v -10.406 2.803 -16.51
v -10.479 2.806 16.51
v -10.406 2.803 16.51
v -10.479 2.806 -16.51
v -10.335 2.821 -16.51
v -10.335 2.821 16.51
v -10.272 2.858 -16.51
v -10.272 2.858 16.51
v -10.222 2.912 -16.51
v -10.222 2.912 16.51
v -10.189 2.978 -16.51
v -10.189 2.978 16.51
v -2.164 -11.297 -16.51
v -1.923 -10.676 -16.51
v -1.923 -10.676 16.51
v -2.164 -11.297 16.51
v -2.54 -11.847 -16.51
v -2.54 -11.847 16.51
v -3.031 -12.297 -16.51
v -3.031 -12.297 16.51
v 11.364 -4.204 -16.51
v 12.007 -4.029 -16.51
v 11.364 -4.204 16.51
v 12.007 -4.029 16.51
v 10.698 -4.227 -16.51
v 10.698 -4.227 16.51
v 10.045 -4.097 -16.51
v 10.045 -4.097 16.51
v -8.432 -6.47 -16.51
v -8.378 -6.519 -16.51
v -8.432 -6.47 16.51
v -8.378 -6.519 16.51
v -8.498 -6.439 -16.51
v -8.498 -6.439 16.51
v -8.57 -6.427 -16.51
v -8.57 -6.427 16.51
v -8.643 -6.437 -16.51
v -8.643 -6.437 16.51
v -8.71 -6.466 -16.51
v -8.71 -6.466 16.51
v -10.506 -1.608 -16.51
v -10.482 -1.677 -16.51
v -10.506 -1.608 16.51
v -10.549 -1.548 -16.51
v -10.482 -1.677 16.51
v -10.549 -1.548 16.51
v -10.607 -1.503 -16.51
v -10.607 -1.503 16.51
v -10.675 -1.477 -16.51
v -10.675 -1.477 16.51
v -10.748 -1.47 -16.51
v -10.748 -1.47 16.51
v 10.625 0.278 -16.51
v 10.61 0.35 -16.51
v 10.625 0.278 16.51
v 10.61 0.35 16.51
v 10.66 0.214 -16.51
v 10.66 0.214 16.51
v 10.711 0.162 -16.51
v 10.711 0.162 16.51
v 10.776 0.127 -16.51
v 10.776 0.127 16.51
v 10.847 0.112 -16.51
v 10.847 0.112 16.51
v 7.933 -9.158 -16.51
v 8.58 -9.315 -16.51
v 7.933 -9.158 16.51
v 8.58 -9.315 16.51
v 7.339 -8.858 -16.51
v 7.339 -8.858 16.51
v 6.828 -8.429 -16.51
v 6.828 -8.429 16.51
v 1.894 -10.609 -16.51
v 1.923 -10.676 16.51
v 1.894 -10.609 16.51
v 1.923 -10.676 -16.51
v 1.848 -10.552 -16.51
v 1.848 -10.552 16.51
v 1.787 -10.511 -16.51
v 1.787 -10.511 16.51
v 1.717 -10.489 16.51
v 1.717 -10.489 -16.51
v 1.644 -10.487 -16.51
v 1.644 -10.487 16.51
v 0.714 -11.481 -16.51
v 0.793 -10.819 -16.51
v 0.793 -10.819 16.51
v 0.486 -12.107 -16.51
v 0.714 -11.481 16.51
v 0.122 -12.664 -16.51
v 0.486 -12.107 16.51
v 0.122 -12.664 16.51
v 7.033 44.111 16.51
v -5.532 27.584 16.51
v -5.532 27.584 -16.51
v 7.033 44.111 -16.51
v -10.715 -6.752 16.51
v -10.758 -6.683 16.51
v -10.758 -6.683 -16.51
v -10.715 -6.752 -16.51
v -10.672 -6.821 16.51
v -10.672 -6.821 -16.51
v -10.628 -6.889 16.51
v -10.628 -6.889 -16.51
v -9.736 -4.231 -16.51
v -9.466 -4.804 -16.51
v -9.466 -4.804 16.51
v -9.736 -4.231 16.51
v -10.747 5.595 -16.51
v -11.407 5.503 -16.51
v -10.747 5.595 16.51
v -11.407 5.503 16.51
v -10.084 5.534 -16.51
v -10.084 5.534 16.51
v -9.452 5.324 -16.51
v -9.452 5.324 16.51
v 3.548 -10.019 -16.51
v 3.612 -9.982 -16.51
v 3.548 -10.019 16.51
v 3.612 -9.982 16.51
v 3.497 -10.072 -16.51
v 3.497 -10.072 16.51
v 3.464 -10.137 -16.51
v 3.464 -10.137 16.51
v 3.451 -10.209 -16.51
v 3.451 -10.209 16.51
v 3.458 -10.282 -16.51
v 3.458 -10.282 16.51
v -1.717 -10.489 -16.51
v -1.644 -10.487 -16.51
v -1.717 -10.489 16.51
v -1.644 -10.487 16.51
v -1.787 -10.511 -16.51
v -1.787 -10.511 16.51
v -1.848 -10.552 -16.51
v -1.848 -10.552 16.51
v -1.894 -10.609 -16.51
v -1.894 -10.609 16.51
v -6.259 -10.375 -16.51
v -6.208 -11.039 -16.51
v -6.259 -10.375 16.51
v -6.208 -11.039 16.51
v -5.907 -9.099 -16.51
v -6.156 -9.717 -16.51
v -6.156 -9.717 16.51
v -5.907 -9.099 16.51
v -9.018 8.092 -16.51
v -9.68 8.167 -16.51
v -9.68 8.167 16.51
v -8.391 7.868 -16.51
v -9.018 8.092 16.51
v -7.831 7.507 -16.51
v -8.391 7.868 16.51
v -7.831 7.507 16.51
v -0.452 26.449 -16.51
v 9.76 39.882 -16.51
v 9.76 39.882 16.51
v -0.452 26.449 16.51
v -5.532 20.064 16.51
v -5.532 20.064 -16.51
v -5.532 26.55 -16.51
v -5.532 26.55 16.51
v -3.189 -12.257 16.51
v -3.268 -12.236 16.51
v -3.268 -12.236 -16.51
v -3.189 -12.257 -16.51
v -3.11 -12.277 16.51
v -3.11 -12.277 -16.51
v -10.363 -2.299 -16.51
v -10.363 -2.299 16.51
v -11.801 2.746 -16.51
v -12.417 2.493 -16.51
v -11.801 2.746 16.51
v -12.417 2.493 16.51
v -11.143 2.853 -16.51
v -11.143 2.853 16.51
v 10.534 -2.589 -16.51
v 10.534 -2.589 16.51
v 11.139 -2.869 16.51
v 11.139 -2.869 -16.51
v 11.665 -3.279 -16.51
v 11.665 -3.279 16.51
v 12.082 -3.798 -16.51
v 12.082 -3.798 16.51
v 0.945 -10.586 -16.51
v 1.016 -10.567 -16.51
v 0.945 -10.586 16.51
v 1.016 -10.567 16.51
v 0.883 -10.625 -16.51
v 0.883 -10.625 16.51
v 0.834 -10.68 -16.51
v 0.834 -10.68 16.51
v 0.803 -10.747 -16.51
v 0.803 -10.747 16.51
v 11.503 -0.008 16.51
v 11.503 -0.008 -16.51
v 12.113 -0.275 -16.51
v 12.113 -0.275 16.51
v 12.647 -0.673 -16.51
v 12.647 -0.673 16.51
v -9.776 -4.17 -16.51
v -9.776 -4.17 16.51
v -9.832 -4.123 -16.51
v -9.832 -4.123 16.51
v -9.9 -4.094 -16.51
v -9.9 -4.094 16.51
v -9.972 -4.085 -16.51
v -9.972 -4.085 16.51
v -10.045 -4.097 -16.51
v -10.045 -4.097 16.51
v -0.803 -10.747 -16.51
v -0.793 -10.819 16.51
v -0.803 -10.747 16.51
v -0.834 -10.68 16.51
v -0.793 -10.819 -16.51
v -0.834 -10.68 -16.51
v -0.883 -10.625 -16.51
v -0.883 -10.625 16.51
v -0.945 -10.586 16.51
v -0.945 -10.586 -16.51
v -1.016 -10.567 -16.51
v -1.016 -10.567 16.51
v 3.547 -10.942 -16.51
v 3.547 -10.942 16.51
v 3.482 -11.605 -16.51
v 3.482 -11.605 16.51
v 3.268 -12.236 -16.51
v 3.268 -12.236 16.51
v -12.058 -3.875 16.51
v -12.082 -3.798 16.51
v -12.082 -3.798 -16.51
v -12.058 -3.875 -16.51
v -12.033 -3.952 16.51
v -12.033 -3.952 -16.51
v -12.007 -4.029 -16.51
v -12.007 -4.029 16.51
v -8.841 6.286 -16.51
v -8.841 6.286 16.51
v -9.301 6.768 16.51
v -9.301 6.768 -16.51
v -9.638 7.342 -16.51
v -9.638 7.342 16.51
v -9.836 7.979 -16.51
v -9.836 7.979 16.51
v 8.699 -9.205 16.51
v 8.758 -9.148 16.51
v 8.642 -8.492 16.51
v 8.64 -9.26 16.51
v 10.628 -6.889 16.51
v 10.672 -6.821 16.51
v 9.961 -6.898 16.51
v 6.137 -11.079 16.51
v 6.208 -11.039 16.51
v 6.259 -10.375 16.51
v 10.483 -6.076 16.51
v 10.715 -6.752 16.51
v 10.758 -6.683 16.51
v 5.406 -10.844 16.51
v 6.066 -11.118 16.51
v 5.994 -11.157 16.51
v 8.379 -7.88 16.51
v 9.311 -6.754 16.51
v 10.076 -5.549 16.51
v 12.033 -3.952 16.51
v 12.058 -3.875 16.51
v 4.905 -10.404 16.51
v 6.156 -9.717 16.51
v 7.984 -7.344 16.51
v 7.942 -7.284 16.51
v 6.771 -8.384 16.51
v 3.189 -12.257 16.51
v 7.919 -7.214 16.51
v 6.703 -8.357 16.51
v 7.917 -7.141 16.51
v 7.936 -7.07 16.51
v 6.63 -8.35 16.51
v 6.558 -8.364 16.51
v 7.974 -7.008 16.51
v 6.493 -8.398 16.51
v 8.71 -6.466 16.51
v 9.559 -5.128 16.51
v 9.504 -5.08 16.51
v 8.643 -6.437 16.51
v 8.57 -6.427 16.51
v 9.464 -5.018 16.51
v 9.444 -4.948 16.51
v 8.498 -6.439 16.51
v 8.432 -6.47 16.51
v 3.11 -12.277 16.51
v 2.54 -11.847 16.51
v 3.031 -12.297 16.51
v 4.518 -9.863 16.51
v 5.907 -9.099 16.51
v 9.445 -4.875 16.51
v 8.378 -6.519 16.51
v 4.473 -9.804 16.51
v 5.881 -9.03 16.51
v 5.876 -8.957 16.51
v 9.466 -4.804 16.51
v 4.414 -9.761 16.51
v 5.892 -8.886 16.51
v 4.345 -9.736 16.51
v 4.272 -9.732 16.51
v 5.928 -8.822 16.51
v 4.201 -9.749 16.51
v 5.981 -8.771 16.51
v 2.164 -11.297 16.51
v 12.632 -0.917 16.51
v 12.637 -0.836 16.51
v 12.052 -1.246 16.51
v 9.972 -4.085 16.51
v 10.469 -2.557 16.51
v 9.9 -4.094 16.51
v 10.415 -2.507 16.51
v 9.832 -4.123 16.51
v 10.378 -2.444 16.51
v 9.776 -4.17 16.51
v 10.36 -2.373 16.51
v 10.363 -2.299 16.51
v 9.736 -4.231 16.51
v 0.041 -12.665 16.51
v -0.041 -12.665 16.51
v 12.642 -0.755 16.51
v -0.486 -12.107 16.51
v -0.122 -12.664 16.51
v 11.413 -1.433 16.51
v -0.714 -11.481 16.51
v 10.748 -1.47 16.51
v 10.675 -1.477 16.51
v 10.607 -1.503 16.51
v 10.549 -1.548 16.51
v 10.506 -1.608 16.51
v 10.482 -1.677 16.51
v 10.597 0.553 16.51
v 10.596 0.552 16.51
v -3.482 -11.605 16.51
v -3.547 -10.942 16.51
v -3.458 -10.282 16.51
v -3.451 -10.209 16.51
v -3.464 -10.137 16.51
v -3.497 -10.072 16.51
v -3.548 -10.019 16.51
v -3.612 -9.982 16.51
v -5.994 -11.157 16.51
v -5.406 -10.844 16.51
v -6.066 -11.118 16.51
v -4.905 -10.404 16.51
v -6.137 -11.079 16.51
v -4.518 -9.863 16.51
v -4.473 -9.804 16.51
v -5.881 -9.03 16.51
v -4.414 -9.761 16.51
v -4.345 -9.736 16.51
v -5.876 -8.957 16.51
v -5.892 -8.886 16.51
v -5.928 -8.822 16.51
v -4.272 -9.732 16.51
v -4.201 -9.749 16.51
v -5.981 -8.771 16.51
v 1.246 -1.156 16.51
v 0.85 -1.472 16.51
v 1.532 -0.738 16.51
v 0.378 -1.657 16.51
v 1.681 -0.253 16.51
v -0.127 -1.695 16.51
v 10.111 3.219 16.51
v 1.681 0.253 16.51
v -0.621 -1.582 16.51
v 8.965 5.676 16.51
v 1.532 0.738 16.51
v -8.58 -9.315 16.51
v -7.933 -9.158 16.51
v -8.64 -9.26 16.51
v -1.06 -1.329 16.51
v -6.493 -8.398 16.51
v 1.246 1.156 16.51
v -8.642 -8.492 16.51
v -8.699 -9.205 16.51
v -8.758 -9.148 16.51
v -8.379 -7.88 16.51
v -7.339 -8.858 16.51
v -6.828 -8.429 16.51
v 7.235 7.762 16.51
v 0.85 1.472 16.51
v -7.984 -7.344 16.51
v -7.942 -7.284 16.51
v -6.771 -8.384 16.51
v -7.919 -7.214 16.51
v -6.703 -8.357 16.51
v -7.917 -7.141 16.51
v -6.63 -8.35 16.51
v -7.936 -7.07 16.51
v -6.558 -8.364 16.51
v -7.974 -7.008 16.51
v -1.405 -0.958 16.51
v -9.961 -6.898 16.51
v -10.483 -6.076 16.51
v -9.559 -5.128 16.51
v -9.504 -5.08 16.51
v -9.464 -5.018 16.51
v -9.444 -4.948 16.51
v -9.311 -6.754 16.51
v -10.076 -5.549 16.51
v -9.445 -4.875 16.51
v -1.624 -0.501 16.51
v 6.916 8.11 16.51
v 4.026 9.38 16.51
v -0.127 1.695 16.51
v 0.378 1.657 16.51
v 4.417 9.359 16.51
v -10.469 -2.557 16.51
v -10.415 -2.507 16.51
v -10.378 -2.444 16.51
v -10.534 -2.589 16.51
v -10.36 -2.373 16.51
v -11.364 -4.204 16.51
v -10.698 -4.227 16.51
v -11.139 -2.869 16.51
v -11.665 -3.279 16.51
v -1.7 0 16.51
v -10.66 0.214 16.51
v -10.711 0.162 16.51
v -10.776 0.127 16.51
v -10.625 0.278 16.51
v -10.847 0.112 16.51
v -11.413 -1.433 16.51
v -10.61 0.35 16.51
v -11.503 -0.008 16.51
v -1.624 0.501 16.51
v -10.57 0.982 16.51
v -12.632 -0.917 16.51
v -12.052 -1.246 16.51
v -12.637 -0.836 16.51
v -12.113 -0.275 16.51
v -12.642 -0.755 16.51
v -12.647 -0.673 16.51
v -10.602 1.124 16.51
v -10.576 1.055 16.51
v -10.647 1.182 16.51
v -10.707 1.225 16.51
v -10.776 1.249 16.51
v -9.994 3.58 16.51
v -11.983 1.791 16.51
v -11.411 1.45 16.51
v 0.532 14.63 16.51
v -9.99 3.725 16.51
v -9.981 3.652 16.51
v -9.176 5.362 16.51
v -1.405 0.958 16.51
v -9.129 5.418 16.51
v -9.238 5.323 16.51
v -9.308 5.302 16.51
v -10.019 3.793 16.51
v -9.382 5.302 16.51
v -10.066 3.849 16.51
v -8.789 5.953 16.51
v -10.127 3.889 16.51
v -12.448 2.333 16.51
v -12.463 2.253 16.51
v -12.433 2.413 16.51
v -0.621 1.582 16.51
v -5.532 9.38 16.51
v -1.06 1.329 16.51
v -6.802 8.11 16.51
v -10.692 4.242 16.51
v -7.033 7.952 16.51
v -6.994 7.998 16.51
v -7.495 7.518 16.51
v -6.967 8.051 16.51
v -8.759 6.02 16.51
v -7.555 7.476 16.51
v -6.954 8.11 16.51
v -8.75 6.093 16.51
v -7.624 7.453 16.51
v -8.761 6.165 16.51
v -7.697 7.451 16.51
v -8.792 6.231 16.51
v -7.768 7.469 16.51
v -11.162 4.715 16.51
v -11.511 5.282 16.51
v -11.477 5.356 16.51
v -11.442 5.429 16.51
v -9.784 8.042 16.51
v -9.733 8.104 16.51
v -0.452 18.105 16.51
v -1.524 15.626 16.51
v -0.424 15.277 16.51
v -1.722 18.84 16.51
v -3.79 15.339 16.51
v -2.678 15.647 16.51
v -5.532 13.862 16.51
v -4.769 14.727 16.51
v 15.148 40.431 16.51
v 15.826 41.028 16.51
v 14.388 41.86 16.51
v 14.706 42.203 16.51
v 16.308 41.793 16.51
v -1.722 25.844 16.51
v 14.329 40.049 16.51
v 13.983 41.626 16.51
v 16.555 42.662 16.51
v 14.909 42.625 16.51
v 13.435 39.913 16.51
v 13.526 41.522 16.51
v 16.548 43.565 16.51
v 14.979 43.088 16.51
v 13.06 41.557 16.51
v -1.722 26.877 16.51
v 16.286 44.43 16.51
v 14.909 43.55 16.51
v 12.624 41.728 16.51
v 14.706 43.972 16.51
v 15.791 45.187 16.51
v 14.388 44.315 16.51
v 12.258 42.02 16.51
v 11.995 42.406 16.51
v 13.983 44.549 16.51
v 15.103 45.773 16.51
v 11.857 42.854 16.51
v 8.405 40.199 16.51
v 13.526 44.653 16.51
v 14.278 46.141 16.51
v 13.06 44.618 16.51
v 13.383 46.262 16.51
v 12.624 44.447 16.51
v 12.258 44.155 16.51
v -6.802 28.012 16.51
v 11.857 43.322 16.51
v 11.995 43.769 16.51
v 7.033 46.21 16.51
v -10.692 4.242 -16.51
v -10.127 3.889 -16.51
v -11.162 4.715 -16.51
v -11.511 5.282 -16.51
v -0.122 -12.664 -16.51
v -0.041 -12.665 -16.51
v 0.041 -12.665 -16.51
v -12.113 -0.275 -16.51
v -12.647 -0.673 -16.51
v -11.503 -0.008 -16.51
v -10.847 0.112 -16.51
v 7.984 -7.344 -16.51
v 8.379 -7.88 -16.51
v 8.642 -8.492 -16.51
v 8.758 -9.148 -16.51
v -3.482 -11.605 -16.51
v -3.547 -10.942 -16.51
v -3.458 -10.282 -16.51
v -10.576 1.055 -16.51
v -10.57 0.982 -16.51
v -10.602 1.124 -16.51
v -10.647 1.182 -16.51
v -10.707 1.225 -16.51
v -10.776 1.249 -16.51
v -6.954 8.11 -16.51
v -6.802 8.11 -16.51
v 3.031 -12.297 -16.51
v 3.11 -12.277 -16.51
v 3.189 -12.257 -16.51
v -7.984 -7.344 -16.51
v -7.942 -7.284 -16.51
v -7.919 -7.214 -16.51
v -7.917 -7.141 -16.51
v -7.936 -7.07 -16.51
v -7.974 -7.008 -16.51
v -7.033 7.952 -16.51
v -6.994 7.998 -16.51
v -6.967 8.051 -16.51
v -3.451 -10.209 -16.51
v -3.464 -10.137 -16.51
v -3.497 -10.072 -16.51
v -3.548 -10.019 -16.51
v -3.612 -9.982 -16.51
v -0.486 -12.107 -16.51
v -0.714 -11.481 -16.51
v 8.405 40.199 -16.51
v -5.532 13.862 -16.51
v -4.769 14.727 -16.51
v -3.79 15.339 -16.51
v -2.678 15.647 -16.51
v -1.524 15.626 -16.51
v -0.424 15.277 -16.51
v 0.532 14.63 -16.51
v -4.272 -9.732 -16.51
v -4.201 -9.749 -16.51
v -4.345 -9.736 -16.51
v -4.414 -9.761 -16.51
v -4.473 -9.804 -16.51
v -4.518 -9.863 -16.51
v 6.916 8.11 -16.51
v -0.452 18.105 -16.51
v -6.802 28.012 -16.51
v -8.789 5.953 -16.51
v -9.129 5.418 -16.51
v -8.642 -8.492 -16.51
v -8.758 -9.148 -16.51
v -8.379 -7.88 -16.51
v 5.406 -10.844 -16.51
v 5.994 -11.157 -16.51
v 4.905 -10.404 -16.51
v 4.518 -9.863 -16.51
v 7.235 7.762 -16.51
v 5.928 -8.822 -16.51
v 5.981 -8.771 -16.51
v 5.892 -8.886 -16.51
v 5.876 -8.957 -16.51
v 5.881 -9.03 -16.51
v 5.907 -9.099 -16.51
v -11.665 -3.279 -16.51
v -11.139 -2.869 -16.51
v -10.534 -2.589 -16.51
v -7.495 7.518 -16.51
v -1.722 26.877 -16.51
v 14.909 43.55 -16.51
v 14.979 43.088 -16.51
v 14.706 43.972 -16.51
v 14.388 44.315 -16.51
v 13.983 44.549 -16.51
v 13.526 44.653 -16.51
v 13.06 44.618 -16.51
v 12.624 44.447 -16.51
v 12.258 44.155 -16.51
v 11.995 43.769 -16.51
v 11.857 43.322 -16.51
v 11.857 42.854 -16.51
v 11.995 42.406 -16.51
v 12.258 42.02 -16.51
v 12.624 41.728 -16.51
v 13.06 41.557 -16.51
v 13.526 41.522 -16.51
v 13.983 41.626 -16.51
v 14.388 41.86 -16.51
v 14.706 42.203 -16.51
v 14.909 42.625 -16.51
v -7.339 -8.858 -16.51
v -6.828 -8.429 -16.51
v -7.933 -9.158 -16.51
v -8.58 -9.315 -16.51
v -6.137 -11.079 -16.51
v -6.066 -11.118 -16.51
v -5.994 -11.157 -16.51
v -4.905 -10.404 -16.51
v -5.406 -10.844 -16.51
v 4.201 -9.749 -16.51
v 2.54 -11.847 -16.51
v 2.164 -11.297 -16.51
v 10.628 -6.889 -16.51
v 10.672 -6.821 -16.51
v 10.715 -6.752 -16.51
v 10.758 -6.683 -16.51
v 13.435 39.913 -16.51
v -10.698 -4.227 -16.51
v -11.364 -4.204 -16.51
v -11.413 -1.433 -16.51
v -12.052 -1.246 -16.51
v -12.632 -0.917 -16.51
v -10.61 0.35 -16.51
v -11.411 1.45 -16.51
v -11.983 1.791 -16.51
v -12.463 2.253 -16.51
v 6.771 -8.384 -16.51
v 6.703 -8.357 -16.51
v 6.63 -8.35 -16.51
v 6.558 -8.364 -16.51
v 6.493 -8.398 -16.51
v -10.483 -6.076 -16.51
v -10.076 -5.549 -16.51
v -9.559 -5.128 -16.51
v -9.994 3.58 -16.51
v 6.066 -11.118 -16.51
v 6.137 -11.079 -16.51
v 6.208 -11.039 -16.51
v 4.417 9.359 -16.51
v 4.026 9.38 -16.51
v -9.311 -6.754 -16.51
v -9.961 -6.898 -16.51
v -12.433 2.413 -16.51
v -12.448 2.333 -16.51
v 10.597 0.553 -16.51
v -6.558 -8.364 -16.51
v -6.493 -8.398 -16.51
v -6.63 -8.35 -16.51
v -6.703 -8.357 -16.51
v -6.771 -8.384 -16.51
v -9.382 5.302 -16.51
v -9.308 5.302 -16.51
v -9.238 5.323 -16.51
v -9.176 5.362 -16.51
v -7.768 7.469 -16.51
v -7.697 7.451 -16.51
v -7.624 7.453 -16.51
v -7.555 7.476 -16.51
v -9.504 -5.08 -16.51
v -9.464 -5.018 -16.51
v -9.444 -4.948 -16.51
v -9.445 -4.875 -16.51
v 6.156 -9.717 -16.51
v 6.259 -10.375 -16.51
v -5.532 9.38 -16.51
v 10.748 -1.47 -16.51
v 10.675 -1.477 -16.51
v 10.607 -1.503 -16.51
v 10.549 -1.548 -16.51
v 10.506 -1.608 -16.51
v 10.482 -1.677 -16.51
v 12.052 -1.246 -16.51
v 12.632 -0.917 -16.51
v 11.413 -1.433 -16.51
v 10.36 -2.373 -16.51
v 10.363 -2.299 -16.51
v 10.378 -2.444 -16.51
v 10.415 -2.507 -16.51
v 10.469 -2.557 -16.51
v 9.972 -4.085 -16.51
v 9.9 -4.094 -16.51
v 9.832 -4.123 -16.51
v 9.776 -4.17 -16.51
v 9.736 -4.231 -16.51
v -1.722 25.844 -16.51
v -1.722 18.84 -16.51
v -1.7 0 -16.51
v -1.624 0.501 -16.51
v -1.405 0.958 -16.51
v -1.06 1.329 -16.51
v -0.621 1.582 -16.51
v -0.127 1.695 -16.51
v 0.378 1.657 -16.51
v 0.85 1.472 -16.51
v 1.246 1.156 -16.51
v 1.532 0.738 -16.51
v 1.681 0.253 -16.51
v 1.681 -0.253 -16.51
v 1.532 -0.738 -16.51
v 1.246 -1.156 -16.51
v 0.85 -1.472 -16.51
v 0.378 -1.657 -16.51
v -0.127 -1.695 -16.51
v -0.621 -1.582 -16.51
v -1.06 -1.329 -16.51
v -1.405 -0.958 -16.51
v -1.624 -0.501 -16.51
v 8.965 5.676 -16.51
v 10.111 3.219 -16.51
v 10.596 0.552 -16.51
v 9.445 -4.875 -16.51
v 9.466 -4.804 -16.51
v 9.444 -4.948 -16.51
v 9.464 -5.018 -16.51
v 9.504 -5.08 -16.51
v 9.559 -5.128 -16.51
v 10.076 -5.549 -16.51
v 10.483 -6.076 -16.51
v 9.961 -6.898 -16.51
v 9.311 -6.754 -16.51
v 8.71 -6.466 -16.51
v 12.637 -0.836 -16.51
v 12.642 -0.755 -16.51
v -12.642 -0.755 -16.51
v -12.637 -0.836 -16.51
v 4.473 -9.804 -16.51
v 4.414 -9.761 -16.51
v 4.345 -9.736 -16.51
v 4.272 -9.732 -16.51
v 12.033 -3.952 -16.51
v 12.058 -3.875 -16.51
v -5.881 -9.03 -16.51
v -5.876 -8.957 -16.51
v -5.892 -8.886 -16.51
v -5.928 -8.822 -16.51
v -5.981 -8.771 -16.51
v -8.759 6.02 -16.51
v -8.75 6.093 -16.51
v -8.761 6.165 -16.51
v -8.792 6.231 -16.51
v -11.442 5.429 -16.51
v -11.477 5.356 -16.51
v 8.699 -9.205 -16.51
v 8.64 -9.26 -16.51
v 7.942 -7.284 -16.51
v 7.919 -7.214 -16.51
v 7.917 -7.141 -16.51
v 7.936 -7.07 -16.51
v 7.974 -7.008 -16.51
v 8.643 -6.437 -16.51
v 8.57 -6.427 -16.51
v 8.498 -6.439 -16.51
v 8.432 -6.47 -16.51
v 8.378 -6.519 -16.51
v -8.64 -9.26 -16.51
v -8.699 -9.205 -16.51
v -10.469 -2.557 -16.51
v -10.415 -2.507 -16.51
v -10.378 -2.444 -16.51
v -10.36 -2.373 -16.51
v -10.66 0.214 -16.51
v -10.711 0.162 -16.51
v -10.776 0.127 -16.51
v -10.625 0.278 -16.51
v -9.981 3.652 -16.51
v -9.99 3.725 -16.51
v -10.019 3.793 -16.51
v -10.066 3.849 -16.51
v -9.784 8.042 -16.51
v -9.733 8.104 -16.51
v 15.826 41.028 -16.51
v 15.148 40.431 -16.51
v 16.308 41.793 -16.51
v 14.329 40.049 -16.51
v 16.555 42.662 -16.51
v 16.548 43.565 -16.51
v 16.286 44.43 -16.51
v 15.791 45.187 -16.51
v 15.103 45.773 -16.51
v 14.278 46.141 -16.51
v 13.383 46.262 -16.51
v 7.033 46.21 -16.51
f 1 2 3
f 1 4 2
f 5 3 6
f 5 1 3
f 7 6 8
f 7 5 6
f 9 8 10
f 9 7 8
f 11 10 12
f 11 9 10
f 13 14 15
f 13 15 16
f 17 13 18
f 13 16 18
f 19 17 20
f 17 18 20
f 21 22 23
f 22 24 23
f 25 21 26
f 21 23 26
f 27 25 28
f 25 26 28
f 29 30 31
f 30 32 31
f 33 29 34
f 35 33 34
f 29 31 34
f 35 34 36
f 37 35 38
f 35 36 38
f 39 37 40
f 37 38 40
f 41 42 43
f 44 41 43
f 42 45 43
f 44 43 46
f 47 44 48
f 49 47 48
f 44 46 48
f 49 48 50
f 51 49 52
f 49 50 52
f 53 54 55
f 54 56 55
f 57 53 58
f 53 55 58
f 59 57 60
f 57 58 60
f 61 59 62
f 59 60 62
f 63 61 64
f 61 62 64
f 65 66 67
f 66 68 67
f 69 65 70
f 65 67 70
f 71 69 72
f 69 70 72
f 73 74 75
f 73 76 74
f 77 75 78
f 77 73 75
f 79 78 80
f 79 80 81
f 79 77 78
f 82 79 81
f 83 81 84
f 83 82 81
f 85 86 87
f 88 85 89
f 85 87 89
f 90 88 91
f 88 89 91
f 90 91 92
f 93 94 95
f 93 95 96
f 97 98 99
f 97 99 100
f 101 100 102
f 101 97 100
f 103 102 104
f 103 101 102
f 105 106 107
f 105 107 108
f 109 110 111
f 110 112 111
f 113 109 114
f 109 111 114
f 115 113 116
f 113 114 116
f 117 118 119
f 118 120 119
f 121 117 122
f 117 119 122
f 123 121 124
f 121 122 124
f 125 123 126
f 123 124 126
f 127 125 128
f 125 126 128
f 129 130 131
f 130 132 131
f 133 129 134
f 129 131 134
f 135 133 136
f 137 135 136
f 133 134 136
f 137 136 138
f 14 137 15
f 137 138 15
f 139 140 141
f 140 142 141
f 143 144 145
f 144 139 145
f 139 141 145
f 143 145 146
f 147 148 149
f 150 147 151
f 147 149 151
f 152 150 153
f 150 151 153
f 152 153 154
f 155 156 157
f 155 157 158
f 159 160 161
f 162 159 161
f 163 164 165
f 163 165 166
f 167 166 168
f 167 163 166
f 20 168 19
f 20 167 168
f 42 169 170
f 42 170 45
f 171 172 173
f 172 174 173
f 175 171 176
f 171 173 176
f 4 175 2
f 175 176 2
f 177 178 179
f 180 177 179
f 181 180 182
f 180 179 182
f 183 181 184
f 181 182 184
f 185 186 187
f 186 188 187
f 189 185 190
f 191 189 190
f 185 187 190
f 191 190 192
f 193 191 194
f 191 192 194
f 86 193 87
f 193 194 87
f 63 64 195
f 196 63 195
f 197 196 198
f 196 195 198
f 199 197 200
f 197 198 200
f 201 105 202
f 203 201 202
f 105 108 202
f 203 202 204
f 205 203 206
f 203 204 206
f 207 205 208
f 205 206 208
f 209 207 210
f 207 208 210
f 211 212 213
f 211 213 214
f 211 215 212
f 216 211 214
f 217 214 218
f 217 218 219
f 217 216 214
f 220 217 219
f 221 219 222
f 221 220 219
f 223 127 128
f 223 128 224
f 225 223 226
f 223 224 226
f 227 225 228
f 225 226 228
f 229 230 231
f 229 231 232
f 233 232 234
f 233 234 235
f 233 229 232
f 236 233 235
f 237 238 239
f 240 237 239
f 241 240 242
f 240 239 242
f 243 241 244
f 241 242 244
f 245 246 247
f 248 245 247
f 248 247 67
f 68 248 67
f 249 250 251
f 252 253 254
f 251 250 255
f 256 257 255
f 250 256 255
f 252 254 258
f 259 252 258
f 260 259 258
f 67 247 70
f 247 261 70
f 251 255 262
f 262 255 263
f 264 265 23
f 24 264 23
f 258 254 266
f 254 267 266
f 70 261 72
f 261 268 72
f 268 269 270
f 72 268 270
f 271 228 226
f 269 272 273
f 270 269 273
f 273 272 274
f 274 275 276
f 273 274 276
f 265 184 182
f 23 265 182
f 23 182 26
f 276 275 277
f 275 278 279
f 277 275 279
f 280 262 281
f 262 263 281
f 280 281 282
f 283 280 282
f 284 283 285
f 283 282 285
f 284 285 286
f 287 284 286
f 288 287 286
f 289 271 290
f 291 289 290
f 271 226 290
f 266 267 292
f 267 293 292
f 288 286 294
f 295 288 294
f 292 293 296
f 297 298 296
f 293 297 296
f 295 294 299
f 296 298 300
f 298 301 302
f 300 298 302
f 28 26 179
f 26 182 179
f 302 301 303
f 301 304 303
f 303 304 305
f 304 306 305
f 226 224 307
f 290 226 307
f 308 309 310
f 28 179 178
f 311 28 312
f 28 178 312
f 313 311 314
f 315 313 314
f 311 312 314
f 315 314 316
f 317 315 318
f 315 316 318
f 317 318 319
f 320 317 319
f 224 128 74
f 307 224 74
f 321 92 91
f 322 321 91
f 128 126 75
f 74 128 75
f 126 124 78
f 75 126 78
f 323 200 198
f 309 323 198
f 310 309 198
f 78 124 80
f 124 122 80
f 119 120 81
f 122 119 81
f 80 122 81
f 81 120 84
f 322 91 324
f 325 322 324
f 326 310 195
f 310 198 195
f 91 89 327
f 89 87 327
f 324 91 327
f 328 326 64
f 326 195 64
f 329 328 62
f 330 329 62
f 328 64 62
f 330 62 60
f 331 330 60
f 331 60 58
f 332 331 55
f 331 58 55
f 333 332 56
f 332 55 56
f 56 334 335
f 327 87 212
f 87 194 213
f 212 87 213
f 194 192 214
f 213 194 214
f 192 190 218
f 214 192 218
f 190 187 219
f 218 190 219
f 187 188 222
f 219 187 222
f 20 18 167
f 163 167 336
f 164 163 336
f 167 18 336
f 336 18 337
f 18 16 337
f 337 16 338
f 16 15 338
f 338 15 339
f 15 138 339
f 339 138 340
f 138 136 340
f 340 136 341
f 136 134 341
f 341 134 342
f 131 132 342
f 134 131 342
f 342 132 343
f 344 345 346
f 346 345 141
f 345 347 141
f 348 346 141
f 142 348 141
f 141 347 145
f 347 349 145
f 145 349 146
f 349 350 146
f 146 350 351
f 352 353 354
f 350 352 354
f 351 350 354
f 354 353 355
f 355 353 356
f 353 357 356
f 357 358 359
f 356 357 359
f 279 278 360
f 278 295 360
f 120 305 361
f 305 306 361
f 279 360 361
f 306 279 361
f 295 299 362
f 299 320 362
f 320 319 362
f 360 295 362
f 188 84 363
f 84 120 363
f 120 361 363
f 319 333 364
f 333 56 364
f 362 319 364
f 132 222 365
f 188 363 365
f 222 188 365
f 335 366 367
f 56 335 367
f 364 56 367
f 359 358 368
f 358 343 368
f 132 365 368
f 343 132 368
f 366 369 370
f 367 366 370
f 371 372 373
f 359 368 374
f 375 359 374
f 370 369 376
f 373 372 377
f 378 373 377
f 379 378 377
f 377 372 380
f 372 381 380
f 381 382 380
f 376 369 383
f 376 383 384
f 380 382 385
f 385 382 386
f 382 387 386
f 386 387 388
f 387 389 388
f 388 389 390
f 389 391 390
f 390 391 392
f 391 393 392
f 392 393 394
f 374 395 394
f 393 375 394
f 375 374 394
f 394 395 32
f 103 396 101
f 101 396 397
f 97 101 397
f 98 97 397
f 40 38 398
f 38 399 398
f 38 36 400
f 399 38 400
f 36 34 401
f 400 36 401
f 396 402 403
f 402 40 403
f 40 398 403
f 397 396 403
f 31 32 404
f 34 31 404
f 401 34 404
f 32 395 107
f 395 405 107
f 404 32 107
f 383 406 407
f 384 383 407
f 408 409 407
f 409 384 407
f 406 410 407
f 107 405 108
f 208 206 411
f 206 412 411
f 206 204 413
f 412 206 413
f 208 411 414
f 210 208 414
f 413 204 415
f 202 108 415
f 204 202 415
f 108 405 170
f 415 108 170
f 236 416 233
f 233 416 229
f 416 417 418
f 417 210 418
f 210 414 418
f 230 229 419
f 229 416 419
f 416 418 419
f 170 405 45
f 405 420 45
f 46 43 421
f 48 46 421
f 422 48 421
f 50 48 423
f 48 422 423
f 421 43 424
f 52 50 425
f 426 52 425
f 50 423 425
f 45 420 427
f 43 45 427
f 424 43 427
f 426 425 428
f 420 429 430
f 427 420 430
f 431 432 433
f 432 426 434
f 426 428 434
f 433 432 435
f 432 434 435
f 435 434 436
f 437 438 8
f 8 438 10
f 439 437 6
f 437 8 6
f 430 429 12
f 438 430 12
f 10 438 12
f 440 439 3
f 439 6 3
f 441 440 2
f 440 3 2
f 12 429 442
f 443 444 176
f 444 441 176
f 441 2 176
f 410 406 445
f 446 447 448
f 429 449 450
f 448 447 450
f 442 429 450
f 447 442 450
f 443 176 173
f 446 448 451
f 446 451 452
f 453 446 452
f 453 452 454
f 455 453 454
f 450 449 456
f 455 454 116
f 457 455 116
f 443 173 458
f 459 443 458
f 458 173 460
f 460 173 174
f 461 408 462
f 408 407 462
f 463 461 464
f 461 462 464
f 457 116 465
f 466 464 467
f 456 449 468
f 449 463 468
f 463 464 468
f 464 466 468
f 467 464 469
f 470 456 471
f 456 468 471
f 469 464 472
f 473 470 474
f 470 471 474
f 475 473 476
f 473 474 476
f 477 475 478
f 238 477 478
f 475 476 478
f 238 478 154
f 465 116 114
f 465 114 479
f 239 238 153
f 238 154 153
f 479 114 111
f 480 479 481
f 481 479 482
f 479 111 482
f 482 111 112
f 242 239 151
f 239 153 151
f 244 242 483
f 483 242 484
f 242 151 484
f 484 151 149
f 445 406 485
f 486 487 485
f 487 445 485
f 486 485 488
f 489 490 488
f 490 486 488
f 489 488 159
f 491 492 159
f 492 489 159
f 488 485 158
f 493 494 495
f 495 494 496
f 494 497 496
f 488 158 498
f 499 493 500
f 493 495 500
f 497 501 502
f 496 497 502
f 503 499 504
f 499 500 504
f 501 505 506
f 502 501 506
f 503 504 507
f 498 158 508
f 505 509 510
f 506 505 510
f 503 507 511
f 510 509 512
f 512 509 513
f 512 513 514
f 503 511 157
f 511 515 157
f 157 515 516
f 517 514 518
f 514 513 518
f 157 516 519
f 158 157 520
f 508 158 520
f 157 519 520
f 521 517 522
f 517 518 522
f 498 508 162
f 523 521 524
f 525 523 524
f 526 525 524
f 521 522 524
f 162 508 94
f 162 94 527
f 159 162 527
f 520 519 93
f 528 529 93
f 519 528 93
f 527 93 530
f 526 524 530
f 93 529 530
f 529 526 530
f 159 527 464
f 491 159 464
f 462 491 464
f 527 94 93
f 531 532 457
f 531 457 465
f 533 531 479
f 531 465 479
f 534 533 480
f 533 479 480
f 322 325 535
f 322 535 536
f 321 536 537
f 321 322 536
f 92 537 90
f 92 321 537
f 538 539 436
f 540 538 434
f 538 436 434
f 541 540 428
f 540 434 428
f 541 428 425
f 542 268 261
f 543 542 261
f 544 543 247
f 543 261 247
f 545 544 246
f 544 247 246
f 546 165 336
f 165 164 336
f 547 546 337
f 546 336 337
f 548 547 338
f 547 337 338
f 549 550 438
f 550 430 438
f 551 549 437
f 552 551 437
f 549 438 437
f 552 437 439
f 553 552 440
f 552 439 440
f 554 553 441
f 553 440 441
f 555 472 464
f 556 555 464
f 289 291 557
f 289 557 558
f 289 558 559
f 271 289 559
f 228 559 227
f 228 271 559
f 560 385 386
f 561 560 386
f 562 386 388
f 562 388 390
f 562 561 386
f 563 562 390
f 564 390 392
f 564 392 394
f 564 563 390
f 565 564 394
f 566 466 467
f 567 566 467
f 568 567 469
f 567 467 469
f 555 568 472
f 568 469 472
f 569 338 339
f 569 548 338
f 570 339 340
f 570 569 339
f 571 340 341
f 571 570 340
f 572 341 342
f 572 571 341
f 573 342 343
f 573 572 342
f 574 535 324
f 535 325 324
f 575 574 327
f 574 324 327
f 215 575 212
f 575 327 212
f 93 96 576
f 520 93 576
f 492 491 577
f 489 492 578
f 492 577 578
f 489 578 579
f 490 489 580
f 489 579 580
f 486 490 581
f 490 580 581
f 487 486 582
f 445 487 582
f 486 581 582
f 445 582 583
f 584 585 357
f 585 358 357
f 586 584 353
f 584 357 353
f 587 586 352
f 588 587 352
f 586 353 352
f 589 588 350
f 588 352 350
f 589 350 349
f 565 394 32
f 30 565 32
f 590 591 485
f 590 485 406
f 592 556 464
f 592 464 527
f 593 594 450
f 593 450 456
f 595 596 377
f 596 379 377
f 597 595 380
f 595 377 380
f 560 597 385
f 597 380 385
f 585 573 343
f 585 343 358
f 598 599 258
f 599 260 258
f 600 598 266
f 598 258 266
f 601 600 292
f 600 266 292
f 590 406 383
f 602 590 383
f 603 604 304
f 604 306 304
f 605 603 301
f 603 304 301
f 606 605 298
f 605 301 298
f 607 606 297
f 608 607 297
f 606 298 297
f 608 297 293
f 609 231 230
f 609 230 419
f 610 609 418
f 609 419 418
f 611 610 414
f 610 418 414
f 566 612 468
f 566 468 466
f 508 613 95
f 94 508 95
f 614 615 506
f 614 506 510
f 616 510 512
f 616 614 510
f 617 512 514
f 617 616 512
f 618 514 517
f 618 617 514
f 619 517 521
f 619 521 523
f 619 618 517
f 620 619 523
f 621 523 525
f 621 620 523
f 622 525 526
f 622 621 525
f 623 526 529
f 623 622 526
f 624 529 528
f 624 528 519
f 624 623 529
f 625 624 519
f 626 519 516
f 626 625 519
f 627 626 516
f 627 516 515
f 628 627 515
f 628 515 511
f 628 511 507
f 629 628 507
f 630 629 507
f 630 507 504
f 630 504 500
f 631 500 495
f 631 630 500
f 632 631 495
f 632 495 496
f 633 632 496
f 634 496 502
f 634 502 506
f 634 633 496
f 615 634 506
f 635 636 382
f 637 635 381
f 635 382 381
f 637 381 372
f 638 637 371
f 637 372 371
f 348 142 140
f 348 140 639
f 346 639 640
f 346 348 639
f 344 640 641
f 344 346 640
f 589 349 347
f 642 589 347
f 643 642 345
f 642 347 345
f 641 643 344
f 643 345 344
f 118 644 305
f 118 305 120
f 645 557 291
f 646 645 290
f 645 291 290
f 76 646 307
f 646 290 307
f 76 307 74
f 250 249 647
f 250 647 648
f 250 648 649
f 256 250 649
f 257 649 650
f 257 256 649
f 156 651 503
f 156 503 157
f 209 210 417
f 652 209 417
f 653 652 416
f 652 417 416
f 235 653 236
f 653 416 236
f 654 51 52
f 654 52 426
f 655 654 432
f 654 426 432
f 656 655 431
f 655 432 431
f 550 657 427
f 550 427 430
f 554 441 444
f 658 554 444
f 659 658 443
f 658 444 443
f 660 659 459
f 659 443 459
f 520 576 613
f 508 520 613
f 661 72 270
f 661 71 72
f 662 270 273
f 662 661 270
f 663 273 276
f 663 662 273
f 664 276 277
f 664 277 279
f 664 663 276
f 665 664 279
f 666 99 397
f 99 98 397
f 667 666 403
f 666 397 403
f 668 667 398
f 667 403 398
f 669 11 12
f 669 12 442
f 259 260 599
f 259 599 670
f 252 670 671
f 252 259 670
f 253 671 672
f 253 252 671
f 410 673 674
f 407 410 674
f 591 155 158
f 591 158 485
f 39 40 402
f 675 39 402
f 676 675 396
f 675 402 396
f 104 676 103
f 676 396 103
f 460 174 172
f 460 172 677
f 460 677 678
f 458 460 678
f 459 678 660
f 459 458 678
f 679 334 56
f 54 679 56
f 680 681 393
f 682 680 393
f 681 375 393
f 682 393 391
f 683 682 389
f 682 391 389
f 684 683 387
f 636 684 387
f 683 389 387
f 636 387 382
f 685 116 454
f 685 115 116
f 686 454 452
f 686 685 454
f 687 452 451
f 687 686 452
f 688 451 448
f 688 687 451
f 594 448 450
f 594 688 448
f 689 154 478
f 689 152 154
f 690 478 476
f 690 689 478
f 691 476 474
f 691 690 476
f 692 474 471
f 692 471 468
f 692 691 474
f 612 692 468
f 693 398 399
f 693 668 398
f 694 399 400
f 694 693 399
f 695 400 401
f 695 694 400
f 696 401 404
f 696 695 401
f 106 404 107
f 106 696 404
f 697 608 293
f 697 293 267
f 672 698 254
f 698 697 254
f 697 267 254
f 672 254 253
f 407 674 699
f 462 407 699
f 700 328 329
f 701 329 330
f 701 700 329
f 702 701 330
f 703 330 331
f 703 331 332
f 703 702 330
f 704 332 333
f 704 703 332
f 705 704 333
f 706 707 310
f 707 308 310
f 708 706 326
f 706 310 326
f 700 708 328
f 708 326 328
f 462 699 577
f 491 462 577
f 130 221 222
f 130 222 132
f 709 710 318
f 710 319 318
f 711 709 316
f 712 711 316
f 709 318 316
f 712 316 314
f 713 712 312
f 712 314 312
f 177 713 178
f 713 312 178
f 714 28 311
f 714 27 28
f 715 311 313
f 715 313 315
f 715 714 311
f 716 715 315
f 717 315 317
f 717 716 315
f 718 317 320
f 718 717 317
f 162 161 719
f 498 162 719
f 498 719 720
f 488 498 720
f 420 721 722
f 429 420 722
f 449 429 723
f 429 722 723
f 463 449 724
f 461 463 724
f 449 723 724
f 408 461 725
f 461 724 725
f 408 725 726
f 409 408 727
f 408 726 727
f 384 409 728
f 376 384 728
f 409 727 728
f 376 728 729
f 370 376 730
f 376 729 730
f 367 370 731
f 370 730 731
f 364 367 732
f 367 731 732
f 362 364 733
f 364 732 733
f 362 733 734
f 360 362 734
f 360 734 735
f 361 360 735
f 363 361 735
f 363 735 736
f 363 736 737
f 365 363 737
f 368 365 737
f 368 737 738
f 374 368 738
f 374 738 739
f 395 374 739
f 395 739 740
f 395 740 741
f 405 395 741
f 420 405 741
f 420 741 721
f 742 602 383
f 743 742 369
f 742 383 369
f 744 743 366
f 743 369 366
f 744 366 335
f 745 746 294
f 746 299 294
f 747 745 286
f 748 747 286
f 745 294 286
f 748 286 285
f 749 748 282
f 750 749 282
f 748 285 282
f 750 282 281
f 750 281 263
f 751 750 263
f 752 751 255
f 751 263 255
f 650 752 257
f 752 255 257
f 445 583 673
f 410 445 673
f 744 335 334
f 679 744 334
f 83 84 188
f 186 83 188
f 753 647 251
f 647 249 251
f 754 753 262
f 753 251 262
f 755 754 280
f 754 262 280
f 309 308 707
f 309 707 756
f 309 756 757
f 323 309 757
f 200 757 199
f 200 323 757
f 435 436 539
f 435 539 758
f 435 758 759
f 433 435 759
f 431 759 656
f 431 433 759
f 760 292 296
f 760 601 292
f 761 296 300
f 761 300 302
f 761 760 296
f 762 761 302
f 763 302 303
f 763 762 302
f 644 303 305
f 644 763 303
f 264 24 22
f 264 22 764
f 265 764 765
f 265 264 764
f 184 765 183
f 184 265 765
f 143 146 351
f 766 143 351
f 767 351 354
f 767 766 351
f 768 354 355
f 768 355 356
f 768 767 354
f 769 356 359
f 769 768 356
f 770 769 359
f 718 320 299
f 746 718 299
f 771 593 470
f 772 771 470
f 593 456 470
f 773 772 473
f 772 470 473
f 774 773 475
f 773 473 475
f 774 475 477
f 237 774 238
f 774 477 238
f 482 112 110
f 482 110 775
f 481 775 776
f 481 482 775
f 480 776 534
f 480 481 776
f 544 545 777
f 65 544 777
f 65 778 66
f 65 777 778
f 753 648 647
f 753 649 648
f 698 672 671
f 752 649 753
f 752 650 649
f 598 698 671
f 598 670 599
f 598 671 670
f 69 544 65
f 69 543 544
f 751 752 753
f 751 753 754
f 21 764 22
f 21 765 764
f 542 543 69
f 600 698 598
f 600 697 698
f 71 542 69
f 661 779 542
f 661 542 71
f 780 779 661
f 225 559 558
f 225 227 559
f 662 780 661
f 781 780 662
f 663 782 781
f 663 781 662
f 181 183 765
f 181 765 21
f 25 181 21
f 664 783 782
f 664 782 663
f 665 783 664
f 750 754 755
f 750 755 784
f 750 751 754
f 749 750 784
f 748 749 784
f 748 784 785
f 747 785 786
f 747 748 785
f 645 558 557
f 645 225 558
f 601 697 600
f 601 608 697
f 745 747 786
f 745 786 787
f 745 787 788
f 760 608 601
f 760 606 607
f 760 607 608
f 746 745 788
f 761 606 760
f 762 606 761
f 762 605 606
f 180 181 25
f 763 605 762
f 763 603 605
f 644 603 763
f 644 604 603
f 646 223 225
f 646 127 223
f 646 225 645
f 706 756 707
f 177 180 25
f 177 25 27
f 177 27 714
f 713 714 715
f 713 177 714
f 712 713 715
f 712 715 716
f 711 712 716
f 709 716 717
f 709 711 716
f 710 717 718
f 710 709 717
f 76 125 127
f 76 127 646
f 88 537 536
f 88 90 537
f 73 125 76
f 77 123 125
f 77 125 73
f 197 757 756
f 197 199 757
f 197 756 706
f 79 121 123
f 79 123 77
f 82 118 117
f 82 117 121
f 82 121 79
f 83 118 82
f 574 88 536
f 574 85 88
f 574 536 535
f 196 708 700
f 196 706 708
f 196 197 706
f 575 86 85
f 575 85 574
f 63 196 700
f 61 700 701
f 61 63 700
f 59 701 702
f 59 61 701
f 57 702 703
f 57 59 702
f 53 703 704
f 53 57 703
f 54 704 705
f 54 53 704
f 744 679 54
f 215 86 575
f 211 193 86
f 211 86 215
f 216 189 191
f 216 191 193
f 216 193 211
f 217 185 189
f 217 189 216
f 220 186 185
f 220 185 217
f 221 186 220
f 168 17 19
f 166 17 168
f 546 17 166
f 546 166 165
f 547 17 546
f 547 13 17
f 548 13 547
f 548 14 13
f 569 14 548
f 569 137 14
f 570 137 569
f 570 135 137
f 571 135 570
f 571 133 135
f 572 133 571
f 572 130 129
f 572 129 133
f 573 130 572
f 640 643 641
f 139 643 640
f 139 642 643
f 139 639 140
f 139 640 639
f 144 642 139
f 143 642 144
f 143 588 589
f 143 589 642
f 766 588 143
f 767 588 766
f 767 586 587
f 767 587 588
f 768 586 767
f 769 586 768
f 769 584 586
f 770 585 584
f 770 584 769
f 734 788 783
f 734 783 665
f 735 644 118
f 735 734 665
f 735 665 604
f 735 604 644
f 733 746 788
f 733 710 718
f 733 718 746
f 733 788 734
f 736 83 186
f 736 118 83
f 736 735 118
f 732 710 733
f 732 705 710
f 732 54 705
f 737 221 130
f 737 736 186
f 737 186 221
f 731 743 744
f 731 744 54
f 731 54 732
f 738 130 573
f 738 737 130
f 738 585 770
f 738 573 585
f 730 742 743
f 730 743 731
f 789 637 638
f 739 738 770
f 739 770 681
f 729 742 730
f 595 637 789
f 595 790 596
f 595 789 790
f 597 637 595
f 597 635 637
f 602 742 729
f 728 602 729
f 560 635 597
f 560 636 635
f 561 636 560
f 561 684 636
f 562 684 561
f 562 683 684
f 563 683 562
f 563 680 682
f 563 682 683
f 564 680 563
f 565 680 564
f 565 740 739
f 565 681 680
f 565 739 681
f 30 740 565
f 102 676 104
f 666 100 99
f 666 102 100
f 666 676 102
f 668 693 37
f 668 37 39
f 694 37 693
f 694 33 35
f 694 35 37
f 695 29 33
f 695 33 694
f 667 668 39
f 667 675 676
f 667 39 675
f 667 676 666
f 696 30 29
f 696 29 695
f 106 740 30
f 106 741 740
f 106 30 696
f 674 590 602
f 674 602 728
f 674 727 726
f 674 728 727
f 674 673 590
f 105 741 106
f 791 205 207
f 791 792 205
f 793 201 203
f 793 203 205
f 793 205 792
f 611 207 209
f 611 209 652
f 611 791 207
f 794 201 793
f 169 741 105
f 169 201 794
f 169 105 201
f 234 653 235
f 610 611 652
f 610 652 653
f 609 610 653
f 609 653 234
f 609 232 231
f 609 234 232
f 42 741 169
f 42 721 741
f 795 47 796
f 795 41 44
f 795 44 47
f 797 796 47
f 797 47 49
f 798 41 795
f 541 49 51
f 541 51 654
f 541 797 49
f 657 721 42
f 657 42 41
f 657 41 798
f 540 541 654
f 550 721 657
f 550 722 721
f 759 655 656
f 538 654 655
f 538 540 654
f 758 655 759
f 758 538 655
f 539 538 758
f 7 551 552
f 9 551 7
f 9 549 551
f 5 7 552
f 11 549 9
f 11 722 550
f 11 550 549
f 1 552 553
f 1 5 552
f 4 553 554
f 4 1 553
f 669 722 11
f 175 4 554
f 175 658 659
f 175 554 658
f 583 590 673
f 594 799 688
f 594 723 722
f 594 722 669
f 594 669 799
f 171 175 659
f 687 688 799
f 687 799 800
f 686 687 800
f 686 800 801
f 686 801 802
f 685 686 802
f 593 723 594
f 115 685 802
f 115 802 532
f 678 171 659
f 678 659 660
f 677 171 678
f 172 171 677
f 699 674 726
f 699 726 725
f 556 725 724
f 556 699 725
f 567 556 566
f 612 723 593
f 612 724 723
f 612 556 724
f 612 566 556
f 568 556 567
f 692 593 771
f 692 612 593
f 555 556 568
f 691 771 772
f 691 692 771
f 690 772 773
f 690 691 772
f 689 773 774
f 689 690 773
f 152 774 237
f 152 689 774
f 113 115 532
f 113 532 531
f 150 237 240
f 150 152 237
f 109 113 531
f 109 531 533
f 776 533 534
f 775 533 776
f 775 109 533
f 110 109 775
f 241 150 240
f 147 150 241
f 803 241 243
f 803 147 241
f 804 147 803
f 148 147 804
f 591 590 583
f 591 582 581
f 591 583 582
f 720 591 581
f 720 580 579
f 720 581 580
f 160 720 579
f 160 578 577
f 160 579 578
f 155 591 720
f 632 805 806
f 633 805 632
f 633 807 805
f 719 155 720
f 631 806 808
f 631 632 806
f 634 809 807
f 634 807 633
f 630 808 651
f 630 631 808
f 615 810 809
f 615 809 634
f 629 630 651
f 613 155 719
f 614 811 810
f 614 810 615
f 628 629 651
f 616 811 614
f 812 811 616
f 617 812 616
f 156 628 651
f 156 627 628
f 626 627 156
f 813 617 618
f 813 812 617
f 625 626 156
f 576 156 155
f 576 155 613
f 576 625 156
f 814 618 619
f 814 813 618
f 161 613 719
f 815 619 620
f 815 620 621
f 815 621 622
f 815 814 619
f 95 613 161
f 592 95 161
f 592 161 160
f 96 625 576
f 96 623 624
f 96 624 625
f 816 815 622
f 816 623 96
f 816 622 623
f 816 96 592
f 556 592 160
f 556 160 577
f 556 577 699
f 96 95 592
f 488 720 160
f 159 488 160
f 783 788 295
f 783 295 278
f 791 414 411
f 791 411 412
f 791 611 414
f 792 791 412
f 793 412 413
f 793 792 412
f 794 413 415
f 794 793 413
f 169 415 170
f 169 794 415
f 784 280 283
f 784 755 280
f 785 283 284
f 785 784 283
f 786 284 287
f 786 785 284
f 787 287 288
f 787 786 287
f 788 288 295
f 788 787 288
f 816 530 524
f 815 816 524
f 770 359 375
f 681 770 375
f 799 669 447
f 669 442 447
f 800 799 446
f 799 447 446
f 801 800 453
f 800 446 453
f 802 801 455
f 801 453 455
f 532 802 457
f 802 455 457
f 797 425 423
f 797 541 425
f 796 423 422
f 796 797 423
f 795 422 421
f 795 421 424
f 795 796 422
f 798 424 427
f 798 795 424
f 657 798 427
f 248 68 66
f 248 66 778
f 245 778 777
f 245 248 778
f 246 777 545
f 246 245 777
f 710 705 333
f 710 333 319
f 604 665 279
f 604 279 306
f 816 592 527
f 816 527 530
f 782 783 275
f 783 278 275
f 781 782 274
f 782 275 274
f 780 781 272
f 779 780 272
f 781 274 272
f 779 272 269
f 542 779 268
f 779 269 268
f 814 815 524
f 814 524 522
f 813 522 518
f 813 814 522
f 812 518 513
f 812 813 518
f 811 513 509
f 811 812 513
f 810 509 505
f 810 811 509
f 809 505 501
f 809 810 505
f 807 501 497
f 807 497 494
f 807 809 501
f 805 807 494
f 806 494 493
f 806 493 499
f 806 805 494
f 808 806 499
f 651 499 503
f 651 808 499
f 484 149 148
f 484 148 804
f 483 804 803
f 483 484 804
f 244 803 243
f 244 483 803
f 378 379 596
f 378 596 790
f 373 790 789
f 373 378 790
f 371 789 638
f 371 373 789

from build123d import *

# Parameters (mm, degrees)
SKETCH1_R                = 12.665001162
BOSS_EXTRUDE1_DEPTH      = 16.51
CUT_EXTRUDE1_DEPTH       = 25.359487041
FILLET1_R                = 0.255000023
CIRPATTERN1_COUNT        = 25
FILLET1_OF_CIRPATTERN1_R = 0.255000023
M3_CLEARANCE_HOLE1_D     = 3.4
SKETCH7_W                = 15.433030704
SKETCH7_H                = 5.386211439
CUT_EXTRUDE2_DEPTH       = 38.558904548
CLAW_PART_DEPTH          = 16.51
CLAW_PART_DEPTH_BACK     = 16.51
SKETCH8_R                = 1.57
CUT_EXTRUDE3_DEPTH       = 60.207872969


with BuildPart() as part:
    # Sketch1 → Boss-Extrude1 (new, symmetric)
    with BuildSketch(Plane.XY):
        Circle(SKETCH1_R)
    extrude(amount=BOSS_EXTRUDE1_DEPTH, both=True)

    # Sketch3 → Cut-Extrude1 (cut, symmetric)
    with BuildSketch(Plane.XY):
        with BuildLine():
            Line((-0.549568511, 10.61077849), (0.549568511, 10.61077849))
            ThreePointArc((0.549568511, 10.61077849), (1.298156627, 12.409330788), (3.016068488, 13.328000136))
            ThreePointArc((3.016068488, 13.328000136), (0, 13.665001162), (-3.016068488, 13.328000136))
            ThreePointArc((-3.016068488, 13.328000136), (-1.298156627, 12.409330788), (-0.549568511, 10.61077849))
        make_face()
    cut_extrude1 = extrude(amount=CUT_EXTRUDE1_DEPTH, both=True, mode=Mode.SUBTRACT)

    # Fillet1
    fillet1_edges = [part.edges().sort_by_distance(p)[0] for p in [
        (-0.549568511, 10.61077849, 0),
        (0.549568511, 10.61077849, 0),
    ]]
    fillet(fillet1_edges, radius=FILLET1_R)

    # CirPattern1: Cut-Extrude1 ×25 about axis, 7 skipped
    cirpattern1_axis = Axis((0, 0, 16.51), (0, 0, 1))
    add([cut_extrude1.rotate(cirpattern1_axis, i * 360 / CIRPATTERN1_COUNT) for i in range(1, CIRPATTERN1_COUNT) if i not in (1, 2, 20, 21, 22, 23, 24)], mode=Mode.SUBTRACT)

    # Fillet1 of CirPattern1
    fillet1_of_cirpattern1_edges = [part.edges().sort_by_distance(p)[0] for p in [
        (-7.66419591, 7.358719098, 0),
        (-6.862959504, 8.111130166, 0),
        (-9.253450125, 5.22152339, 0),
        (-8.664503057, 6.149555472, 0),
        (-10.261276036, 2.756240163, 0),
        (-9.921624017, 3.801581591, 0),
        (-10.624348235, 0.117772231, 0),
        (-10.55533285, 1.214740357, 0),
        (-10.319853561, -2.528095764, 0),
        (-10.525811301, -1.44842748, 0),
        (-9.366924534, -5.015114205, 0),
        (-9.834914317, -4.020585292, 0),
        (-7.82543719, -7.187014575, 0),
        (-8.526053496, -6.340114944, 0),
        (-5.792248847, -8.907328388, 0),
        (-6.681469377, -8.261271856, 0),
        (-3.395112206, -10.067962, 0),
        (-4.417063965, -9.663342675, 0),
        (-0.784648179, -10.595988531, 0),
        (-1.875118178, -10.458230134, 0),
        (1.875118178, -10.458230134, 0),
        (0.784648179, -10.595988531, 0),
        (4.417063965, -9.663342675, 0),
        (3.395112206, -10.067962, 0),
        (6.681469377, -8.261271856, 0),
        (5.792248847, -8.907328388, 0),
        (8.526053496, -6.340114944, 0),
        (7.82543719, -7.187014575, 0),
        (9.834914317, -4.020585292, 0),
        (9.366924534, -5.015114205, 0),
        (10.525811301, -1.44842748, 0),
        (10.319853561, -2.528095764, 0),
        (10.55533285, 1.214740357, 0),
        (10.624348235, 0.117772231, 0),
    ]]
    fillet(fillet1_of_cirpattern1_edges, radius=FILLET1_OF_CIRPATTERN1_R)

    # M3 Clearance Hole1 (through all)
    with Locations(Plane.XY.offset(16.51)):
        with Locations((0, 0)):
            Hole(M3_CLEARANCE_HOLE1_D / 2)

    # Sketch7 → Cut-Extrude2 (cut, through all)
    with BuildSketch(Plane.XY.offset(16.51)):
        with Locations((0.047493999, 10.802685467)):
            Rectangle(SKETCH7_W, SKETCH7_H)
    extrude(amount=-CUT_EXTRUDE2_DEPTH, mode=Mode.SUBTRACT)

    # Sketch8 → claw part (add, two sides: drawn at the far end of the back side and taken through both)
    with BuildSketch(Plane.XY.offset(-CLAW_PART_DEPTH_BACK)):
        with BuildLine():
            Line((3.992994947, 8.109579748), (-6.802497273, 8.109579748))
            Line((-6.802497273, 8.109579748), (-6.802497273, 28.011546875))
            Line((-6.802497273, 28.011546875), (7.032646368, 46.209579748))
            Line((7.032646368, 46.209579748), (13.382646368, 46.262410098))
            ThreePointArc((13.382646368, 46.262410098), (16.583950751, 43.113934237), (13.43547489, 39.912629854))
            Line((13.43547489, 39.912629854), (9.759859293, 39.882049687))
            Line((9.759859293, 39.882049687), (-0.452497273, 26.449243689))
            Line((-0.452497273, 26.449243689), (-0.452497273, 18.105340478))
            Line((-0.452497273, 18.105340478), (7.032646368, 7.951783594))
            Line((7.032646368, 7.951783594), (3.992994947, 8.109579748))
        make_face()
        with Locations((13.409060629, 43.087519976)):
            Circle(SKETCH8_R, mode=Mode.SUBTRACT)
        with BuildLine():
            Line((-5.532497273, 9.379579748), (-5.532497273, 13.862489028))
            ThreePointArc((-5.532497273, 13.862489028), (-2.677856166, 15.64723367), (0.531514386, 14.630262706))
            Line((0.531514386, 14.630262706), (4.417263537, 9.35926499))
            Line((4.417263537, 9.35926499), (4.025937257, 9.379579748))
            Line((4.025937257, 9.379579748), (-5.532497273, 9.379579748))
        make_face(mode=Mode.SUBTRACT)
        Polygon((-5.532497273, 27.583600596), (7.032646368, 44.111141108), (8.405146513, 40.198569154), (-1.722497273, 26.877189969), align=None, mode=Mode.SUBTRACT)
        Polygon((-1.722497273, 25.843874151), (-1.722497273, 18.840272222), (-5.532497273, 20.064062183), (-5.532497273, 26.550284777), align=None, mode=Mode.SUBTRACT)
    extrude(amount=CLAW_PART_DEPTH + CLAW_PART_DEPTH_BACK)

    # Sketch9 → Cut-Extrude3 (cut, through all)
    with BuildSketch(Plane.XY.offset(16.51)):
        with BuildLine():
            Line((6.916319953, 8.109579748), (7.234748251, 7.761896541))
            ThreePointArc((7.234748251, 7.761896541), (9.616723385, 4.484111006), (10.596386978, 0.552451967))
            Line((10.596386978, 0.552451967), (13.513134005, 1.97023997))
            Line((13.513134005, 1.97023997), (13.760629426, 4.432819406))
            Line((13.760629426, 4.432819406), (7.95686181, 10.69445355))
            Line((7.95686181, 10.69445355), (6.916319953, 8.109579748))
        make_face()
    extrude(amount=-CUT_EXTRUDE3_DEPTH, mode=Mode.SUBTRACT)


solid = part.part
